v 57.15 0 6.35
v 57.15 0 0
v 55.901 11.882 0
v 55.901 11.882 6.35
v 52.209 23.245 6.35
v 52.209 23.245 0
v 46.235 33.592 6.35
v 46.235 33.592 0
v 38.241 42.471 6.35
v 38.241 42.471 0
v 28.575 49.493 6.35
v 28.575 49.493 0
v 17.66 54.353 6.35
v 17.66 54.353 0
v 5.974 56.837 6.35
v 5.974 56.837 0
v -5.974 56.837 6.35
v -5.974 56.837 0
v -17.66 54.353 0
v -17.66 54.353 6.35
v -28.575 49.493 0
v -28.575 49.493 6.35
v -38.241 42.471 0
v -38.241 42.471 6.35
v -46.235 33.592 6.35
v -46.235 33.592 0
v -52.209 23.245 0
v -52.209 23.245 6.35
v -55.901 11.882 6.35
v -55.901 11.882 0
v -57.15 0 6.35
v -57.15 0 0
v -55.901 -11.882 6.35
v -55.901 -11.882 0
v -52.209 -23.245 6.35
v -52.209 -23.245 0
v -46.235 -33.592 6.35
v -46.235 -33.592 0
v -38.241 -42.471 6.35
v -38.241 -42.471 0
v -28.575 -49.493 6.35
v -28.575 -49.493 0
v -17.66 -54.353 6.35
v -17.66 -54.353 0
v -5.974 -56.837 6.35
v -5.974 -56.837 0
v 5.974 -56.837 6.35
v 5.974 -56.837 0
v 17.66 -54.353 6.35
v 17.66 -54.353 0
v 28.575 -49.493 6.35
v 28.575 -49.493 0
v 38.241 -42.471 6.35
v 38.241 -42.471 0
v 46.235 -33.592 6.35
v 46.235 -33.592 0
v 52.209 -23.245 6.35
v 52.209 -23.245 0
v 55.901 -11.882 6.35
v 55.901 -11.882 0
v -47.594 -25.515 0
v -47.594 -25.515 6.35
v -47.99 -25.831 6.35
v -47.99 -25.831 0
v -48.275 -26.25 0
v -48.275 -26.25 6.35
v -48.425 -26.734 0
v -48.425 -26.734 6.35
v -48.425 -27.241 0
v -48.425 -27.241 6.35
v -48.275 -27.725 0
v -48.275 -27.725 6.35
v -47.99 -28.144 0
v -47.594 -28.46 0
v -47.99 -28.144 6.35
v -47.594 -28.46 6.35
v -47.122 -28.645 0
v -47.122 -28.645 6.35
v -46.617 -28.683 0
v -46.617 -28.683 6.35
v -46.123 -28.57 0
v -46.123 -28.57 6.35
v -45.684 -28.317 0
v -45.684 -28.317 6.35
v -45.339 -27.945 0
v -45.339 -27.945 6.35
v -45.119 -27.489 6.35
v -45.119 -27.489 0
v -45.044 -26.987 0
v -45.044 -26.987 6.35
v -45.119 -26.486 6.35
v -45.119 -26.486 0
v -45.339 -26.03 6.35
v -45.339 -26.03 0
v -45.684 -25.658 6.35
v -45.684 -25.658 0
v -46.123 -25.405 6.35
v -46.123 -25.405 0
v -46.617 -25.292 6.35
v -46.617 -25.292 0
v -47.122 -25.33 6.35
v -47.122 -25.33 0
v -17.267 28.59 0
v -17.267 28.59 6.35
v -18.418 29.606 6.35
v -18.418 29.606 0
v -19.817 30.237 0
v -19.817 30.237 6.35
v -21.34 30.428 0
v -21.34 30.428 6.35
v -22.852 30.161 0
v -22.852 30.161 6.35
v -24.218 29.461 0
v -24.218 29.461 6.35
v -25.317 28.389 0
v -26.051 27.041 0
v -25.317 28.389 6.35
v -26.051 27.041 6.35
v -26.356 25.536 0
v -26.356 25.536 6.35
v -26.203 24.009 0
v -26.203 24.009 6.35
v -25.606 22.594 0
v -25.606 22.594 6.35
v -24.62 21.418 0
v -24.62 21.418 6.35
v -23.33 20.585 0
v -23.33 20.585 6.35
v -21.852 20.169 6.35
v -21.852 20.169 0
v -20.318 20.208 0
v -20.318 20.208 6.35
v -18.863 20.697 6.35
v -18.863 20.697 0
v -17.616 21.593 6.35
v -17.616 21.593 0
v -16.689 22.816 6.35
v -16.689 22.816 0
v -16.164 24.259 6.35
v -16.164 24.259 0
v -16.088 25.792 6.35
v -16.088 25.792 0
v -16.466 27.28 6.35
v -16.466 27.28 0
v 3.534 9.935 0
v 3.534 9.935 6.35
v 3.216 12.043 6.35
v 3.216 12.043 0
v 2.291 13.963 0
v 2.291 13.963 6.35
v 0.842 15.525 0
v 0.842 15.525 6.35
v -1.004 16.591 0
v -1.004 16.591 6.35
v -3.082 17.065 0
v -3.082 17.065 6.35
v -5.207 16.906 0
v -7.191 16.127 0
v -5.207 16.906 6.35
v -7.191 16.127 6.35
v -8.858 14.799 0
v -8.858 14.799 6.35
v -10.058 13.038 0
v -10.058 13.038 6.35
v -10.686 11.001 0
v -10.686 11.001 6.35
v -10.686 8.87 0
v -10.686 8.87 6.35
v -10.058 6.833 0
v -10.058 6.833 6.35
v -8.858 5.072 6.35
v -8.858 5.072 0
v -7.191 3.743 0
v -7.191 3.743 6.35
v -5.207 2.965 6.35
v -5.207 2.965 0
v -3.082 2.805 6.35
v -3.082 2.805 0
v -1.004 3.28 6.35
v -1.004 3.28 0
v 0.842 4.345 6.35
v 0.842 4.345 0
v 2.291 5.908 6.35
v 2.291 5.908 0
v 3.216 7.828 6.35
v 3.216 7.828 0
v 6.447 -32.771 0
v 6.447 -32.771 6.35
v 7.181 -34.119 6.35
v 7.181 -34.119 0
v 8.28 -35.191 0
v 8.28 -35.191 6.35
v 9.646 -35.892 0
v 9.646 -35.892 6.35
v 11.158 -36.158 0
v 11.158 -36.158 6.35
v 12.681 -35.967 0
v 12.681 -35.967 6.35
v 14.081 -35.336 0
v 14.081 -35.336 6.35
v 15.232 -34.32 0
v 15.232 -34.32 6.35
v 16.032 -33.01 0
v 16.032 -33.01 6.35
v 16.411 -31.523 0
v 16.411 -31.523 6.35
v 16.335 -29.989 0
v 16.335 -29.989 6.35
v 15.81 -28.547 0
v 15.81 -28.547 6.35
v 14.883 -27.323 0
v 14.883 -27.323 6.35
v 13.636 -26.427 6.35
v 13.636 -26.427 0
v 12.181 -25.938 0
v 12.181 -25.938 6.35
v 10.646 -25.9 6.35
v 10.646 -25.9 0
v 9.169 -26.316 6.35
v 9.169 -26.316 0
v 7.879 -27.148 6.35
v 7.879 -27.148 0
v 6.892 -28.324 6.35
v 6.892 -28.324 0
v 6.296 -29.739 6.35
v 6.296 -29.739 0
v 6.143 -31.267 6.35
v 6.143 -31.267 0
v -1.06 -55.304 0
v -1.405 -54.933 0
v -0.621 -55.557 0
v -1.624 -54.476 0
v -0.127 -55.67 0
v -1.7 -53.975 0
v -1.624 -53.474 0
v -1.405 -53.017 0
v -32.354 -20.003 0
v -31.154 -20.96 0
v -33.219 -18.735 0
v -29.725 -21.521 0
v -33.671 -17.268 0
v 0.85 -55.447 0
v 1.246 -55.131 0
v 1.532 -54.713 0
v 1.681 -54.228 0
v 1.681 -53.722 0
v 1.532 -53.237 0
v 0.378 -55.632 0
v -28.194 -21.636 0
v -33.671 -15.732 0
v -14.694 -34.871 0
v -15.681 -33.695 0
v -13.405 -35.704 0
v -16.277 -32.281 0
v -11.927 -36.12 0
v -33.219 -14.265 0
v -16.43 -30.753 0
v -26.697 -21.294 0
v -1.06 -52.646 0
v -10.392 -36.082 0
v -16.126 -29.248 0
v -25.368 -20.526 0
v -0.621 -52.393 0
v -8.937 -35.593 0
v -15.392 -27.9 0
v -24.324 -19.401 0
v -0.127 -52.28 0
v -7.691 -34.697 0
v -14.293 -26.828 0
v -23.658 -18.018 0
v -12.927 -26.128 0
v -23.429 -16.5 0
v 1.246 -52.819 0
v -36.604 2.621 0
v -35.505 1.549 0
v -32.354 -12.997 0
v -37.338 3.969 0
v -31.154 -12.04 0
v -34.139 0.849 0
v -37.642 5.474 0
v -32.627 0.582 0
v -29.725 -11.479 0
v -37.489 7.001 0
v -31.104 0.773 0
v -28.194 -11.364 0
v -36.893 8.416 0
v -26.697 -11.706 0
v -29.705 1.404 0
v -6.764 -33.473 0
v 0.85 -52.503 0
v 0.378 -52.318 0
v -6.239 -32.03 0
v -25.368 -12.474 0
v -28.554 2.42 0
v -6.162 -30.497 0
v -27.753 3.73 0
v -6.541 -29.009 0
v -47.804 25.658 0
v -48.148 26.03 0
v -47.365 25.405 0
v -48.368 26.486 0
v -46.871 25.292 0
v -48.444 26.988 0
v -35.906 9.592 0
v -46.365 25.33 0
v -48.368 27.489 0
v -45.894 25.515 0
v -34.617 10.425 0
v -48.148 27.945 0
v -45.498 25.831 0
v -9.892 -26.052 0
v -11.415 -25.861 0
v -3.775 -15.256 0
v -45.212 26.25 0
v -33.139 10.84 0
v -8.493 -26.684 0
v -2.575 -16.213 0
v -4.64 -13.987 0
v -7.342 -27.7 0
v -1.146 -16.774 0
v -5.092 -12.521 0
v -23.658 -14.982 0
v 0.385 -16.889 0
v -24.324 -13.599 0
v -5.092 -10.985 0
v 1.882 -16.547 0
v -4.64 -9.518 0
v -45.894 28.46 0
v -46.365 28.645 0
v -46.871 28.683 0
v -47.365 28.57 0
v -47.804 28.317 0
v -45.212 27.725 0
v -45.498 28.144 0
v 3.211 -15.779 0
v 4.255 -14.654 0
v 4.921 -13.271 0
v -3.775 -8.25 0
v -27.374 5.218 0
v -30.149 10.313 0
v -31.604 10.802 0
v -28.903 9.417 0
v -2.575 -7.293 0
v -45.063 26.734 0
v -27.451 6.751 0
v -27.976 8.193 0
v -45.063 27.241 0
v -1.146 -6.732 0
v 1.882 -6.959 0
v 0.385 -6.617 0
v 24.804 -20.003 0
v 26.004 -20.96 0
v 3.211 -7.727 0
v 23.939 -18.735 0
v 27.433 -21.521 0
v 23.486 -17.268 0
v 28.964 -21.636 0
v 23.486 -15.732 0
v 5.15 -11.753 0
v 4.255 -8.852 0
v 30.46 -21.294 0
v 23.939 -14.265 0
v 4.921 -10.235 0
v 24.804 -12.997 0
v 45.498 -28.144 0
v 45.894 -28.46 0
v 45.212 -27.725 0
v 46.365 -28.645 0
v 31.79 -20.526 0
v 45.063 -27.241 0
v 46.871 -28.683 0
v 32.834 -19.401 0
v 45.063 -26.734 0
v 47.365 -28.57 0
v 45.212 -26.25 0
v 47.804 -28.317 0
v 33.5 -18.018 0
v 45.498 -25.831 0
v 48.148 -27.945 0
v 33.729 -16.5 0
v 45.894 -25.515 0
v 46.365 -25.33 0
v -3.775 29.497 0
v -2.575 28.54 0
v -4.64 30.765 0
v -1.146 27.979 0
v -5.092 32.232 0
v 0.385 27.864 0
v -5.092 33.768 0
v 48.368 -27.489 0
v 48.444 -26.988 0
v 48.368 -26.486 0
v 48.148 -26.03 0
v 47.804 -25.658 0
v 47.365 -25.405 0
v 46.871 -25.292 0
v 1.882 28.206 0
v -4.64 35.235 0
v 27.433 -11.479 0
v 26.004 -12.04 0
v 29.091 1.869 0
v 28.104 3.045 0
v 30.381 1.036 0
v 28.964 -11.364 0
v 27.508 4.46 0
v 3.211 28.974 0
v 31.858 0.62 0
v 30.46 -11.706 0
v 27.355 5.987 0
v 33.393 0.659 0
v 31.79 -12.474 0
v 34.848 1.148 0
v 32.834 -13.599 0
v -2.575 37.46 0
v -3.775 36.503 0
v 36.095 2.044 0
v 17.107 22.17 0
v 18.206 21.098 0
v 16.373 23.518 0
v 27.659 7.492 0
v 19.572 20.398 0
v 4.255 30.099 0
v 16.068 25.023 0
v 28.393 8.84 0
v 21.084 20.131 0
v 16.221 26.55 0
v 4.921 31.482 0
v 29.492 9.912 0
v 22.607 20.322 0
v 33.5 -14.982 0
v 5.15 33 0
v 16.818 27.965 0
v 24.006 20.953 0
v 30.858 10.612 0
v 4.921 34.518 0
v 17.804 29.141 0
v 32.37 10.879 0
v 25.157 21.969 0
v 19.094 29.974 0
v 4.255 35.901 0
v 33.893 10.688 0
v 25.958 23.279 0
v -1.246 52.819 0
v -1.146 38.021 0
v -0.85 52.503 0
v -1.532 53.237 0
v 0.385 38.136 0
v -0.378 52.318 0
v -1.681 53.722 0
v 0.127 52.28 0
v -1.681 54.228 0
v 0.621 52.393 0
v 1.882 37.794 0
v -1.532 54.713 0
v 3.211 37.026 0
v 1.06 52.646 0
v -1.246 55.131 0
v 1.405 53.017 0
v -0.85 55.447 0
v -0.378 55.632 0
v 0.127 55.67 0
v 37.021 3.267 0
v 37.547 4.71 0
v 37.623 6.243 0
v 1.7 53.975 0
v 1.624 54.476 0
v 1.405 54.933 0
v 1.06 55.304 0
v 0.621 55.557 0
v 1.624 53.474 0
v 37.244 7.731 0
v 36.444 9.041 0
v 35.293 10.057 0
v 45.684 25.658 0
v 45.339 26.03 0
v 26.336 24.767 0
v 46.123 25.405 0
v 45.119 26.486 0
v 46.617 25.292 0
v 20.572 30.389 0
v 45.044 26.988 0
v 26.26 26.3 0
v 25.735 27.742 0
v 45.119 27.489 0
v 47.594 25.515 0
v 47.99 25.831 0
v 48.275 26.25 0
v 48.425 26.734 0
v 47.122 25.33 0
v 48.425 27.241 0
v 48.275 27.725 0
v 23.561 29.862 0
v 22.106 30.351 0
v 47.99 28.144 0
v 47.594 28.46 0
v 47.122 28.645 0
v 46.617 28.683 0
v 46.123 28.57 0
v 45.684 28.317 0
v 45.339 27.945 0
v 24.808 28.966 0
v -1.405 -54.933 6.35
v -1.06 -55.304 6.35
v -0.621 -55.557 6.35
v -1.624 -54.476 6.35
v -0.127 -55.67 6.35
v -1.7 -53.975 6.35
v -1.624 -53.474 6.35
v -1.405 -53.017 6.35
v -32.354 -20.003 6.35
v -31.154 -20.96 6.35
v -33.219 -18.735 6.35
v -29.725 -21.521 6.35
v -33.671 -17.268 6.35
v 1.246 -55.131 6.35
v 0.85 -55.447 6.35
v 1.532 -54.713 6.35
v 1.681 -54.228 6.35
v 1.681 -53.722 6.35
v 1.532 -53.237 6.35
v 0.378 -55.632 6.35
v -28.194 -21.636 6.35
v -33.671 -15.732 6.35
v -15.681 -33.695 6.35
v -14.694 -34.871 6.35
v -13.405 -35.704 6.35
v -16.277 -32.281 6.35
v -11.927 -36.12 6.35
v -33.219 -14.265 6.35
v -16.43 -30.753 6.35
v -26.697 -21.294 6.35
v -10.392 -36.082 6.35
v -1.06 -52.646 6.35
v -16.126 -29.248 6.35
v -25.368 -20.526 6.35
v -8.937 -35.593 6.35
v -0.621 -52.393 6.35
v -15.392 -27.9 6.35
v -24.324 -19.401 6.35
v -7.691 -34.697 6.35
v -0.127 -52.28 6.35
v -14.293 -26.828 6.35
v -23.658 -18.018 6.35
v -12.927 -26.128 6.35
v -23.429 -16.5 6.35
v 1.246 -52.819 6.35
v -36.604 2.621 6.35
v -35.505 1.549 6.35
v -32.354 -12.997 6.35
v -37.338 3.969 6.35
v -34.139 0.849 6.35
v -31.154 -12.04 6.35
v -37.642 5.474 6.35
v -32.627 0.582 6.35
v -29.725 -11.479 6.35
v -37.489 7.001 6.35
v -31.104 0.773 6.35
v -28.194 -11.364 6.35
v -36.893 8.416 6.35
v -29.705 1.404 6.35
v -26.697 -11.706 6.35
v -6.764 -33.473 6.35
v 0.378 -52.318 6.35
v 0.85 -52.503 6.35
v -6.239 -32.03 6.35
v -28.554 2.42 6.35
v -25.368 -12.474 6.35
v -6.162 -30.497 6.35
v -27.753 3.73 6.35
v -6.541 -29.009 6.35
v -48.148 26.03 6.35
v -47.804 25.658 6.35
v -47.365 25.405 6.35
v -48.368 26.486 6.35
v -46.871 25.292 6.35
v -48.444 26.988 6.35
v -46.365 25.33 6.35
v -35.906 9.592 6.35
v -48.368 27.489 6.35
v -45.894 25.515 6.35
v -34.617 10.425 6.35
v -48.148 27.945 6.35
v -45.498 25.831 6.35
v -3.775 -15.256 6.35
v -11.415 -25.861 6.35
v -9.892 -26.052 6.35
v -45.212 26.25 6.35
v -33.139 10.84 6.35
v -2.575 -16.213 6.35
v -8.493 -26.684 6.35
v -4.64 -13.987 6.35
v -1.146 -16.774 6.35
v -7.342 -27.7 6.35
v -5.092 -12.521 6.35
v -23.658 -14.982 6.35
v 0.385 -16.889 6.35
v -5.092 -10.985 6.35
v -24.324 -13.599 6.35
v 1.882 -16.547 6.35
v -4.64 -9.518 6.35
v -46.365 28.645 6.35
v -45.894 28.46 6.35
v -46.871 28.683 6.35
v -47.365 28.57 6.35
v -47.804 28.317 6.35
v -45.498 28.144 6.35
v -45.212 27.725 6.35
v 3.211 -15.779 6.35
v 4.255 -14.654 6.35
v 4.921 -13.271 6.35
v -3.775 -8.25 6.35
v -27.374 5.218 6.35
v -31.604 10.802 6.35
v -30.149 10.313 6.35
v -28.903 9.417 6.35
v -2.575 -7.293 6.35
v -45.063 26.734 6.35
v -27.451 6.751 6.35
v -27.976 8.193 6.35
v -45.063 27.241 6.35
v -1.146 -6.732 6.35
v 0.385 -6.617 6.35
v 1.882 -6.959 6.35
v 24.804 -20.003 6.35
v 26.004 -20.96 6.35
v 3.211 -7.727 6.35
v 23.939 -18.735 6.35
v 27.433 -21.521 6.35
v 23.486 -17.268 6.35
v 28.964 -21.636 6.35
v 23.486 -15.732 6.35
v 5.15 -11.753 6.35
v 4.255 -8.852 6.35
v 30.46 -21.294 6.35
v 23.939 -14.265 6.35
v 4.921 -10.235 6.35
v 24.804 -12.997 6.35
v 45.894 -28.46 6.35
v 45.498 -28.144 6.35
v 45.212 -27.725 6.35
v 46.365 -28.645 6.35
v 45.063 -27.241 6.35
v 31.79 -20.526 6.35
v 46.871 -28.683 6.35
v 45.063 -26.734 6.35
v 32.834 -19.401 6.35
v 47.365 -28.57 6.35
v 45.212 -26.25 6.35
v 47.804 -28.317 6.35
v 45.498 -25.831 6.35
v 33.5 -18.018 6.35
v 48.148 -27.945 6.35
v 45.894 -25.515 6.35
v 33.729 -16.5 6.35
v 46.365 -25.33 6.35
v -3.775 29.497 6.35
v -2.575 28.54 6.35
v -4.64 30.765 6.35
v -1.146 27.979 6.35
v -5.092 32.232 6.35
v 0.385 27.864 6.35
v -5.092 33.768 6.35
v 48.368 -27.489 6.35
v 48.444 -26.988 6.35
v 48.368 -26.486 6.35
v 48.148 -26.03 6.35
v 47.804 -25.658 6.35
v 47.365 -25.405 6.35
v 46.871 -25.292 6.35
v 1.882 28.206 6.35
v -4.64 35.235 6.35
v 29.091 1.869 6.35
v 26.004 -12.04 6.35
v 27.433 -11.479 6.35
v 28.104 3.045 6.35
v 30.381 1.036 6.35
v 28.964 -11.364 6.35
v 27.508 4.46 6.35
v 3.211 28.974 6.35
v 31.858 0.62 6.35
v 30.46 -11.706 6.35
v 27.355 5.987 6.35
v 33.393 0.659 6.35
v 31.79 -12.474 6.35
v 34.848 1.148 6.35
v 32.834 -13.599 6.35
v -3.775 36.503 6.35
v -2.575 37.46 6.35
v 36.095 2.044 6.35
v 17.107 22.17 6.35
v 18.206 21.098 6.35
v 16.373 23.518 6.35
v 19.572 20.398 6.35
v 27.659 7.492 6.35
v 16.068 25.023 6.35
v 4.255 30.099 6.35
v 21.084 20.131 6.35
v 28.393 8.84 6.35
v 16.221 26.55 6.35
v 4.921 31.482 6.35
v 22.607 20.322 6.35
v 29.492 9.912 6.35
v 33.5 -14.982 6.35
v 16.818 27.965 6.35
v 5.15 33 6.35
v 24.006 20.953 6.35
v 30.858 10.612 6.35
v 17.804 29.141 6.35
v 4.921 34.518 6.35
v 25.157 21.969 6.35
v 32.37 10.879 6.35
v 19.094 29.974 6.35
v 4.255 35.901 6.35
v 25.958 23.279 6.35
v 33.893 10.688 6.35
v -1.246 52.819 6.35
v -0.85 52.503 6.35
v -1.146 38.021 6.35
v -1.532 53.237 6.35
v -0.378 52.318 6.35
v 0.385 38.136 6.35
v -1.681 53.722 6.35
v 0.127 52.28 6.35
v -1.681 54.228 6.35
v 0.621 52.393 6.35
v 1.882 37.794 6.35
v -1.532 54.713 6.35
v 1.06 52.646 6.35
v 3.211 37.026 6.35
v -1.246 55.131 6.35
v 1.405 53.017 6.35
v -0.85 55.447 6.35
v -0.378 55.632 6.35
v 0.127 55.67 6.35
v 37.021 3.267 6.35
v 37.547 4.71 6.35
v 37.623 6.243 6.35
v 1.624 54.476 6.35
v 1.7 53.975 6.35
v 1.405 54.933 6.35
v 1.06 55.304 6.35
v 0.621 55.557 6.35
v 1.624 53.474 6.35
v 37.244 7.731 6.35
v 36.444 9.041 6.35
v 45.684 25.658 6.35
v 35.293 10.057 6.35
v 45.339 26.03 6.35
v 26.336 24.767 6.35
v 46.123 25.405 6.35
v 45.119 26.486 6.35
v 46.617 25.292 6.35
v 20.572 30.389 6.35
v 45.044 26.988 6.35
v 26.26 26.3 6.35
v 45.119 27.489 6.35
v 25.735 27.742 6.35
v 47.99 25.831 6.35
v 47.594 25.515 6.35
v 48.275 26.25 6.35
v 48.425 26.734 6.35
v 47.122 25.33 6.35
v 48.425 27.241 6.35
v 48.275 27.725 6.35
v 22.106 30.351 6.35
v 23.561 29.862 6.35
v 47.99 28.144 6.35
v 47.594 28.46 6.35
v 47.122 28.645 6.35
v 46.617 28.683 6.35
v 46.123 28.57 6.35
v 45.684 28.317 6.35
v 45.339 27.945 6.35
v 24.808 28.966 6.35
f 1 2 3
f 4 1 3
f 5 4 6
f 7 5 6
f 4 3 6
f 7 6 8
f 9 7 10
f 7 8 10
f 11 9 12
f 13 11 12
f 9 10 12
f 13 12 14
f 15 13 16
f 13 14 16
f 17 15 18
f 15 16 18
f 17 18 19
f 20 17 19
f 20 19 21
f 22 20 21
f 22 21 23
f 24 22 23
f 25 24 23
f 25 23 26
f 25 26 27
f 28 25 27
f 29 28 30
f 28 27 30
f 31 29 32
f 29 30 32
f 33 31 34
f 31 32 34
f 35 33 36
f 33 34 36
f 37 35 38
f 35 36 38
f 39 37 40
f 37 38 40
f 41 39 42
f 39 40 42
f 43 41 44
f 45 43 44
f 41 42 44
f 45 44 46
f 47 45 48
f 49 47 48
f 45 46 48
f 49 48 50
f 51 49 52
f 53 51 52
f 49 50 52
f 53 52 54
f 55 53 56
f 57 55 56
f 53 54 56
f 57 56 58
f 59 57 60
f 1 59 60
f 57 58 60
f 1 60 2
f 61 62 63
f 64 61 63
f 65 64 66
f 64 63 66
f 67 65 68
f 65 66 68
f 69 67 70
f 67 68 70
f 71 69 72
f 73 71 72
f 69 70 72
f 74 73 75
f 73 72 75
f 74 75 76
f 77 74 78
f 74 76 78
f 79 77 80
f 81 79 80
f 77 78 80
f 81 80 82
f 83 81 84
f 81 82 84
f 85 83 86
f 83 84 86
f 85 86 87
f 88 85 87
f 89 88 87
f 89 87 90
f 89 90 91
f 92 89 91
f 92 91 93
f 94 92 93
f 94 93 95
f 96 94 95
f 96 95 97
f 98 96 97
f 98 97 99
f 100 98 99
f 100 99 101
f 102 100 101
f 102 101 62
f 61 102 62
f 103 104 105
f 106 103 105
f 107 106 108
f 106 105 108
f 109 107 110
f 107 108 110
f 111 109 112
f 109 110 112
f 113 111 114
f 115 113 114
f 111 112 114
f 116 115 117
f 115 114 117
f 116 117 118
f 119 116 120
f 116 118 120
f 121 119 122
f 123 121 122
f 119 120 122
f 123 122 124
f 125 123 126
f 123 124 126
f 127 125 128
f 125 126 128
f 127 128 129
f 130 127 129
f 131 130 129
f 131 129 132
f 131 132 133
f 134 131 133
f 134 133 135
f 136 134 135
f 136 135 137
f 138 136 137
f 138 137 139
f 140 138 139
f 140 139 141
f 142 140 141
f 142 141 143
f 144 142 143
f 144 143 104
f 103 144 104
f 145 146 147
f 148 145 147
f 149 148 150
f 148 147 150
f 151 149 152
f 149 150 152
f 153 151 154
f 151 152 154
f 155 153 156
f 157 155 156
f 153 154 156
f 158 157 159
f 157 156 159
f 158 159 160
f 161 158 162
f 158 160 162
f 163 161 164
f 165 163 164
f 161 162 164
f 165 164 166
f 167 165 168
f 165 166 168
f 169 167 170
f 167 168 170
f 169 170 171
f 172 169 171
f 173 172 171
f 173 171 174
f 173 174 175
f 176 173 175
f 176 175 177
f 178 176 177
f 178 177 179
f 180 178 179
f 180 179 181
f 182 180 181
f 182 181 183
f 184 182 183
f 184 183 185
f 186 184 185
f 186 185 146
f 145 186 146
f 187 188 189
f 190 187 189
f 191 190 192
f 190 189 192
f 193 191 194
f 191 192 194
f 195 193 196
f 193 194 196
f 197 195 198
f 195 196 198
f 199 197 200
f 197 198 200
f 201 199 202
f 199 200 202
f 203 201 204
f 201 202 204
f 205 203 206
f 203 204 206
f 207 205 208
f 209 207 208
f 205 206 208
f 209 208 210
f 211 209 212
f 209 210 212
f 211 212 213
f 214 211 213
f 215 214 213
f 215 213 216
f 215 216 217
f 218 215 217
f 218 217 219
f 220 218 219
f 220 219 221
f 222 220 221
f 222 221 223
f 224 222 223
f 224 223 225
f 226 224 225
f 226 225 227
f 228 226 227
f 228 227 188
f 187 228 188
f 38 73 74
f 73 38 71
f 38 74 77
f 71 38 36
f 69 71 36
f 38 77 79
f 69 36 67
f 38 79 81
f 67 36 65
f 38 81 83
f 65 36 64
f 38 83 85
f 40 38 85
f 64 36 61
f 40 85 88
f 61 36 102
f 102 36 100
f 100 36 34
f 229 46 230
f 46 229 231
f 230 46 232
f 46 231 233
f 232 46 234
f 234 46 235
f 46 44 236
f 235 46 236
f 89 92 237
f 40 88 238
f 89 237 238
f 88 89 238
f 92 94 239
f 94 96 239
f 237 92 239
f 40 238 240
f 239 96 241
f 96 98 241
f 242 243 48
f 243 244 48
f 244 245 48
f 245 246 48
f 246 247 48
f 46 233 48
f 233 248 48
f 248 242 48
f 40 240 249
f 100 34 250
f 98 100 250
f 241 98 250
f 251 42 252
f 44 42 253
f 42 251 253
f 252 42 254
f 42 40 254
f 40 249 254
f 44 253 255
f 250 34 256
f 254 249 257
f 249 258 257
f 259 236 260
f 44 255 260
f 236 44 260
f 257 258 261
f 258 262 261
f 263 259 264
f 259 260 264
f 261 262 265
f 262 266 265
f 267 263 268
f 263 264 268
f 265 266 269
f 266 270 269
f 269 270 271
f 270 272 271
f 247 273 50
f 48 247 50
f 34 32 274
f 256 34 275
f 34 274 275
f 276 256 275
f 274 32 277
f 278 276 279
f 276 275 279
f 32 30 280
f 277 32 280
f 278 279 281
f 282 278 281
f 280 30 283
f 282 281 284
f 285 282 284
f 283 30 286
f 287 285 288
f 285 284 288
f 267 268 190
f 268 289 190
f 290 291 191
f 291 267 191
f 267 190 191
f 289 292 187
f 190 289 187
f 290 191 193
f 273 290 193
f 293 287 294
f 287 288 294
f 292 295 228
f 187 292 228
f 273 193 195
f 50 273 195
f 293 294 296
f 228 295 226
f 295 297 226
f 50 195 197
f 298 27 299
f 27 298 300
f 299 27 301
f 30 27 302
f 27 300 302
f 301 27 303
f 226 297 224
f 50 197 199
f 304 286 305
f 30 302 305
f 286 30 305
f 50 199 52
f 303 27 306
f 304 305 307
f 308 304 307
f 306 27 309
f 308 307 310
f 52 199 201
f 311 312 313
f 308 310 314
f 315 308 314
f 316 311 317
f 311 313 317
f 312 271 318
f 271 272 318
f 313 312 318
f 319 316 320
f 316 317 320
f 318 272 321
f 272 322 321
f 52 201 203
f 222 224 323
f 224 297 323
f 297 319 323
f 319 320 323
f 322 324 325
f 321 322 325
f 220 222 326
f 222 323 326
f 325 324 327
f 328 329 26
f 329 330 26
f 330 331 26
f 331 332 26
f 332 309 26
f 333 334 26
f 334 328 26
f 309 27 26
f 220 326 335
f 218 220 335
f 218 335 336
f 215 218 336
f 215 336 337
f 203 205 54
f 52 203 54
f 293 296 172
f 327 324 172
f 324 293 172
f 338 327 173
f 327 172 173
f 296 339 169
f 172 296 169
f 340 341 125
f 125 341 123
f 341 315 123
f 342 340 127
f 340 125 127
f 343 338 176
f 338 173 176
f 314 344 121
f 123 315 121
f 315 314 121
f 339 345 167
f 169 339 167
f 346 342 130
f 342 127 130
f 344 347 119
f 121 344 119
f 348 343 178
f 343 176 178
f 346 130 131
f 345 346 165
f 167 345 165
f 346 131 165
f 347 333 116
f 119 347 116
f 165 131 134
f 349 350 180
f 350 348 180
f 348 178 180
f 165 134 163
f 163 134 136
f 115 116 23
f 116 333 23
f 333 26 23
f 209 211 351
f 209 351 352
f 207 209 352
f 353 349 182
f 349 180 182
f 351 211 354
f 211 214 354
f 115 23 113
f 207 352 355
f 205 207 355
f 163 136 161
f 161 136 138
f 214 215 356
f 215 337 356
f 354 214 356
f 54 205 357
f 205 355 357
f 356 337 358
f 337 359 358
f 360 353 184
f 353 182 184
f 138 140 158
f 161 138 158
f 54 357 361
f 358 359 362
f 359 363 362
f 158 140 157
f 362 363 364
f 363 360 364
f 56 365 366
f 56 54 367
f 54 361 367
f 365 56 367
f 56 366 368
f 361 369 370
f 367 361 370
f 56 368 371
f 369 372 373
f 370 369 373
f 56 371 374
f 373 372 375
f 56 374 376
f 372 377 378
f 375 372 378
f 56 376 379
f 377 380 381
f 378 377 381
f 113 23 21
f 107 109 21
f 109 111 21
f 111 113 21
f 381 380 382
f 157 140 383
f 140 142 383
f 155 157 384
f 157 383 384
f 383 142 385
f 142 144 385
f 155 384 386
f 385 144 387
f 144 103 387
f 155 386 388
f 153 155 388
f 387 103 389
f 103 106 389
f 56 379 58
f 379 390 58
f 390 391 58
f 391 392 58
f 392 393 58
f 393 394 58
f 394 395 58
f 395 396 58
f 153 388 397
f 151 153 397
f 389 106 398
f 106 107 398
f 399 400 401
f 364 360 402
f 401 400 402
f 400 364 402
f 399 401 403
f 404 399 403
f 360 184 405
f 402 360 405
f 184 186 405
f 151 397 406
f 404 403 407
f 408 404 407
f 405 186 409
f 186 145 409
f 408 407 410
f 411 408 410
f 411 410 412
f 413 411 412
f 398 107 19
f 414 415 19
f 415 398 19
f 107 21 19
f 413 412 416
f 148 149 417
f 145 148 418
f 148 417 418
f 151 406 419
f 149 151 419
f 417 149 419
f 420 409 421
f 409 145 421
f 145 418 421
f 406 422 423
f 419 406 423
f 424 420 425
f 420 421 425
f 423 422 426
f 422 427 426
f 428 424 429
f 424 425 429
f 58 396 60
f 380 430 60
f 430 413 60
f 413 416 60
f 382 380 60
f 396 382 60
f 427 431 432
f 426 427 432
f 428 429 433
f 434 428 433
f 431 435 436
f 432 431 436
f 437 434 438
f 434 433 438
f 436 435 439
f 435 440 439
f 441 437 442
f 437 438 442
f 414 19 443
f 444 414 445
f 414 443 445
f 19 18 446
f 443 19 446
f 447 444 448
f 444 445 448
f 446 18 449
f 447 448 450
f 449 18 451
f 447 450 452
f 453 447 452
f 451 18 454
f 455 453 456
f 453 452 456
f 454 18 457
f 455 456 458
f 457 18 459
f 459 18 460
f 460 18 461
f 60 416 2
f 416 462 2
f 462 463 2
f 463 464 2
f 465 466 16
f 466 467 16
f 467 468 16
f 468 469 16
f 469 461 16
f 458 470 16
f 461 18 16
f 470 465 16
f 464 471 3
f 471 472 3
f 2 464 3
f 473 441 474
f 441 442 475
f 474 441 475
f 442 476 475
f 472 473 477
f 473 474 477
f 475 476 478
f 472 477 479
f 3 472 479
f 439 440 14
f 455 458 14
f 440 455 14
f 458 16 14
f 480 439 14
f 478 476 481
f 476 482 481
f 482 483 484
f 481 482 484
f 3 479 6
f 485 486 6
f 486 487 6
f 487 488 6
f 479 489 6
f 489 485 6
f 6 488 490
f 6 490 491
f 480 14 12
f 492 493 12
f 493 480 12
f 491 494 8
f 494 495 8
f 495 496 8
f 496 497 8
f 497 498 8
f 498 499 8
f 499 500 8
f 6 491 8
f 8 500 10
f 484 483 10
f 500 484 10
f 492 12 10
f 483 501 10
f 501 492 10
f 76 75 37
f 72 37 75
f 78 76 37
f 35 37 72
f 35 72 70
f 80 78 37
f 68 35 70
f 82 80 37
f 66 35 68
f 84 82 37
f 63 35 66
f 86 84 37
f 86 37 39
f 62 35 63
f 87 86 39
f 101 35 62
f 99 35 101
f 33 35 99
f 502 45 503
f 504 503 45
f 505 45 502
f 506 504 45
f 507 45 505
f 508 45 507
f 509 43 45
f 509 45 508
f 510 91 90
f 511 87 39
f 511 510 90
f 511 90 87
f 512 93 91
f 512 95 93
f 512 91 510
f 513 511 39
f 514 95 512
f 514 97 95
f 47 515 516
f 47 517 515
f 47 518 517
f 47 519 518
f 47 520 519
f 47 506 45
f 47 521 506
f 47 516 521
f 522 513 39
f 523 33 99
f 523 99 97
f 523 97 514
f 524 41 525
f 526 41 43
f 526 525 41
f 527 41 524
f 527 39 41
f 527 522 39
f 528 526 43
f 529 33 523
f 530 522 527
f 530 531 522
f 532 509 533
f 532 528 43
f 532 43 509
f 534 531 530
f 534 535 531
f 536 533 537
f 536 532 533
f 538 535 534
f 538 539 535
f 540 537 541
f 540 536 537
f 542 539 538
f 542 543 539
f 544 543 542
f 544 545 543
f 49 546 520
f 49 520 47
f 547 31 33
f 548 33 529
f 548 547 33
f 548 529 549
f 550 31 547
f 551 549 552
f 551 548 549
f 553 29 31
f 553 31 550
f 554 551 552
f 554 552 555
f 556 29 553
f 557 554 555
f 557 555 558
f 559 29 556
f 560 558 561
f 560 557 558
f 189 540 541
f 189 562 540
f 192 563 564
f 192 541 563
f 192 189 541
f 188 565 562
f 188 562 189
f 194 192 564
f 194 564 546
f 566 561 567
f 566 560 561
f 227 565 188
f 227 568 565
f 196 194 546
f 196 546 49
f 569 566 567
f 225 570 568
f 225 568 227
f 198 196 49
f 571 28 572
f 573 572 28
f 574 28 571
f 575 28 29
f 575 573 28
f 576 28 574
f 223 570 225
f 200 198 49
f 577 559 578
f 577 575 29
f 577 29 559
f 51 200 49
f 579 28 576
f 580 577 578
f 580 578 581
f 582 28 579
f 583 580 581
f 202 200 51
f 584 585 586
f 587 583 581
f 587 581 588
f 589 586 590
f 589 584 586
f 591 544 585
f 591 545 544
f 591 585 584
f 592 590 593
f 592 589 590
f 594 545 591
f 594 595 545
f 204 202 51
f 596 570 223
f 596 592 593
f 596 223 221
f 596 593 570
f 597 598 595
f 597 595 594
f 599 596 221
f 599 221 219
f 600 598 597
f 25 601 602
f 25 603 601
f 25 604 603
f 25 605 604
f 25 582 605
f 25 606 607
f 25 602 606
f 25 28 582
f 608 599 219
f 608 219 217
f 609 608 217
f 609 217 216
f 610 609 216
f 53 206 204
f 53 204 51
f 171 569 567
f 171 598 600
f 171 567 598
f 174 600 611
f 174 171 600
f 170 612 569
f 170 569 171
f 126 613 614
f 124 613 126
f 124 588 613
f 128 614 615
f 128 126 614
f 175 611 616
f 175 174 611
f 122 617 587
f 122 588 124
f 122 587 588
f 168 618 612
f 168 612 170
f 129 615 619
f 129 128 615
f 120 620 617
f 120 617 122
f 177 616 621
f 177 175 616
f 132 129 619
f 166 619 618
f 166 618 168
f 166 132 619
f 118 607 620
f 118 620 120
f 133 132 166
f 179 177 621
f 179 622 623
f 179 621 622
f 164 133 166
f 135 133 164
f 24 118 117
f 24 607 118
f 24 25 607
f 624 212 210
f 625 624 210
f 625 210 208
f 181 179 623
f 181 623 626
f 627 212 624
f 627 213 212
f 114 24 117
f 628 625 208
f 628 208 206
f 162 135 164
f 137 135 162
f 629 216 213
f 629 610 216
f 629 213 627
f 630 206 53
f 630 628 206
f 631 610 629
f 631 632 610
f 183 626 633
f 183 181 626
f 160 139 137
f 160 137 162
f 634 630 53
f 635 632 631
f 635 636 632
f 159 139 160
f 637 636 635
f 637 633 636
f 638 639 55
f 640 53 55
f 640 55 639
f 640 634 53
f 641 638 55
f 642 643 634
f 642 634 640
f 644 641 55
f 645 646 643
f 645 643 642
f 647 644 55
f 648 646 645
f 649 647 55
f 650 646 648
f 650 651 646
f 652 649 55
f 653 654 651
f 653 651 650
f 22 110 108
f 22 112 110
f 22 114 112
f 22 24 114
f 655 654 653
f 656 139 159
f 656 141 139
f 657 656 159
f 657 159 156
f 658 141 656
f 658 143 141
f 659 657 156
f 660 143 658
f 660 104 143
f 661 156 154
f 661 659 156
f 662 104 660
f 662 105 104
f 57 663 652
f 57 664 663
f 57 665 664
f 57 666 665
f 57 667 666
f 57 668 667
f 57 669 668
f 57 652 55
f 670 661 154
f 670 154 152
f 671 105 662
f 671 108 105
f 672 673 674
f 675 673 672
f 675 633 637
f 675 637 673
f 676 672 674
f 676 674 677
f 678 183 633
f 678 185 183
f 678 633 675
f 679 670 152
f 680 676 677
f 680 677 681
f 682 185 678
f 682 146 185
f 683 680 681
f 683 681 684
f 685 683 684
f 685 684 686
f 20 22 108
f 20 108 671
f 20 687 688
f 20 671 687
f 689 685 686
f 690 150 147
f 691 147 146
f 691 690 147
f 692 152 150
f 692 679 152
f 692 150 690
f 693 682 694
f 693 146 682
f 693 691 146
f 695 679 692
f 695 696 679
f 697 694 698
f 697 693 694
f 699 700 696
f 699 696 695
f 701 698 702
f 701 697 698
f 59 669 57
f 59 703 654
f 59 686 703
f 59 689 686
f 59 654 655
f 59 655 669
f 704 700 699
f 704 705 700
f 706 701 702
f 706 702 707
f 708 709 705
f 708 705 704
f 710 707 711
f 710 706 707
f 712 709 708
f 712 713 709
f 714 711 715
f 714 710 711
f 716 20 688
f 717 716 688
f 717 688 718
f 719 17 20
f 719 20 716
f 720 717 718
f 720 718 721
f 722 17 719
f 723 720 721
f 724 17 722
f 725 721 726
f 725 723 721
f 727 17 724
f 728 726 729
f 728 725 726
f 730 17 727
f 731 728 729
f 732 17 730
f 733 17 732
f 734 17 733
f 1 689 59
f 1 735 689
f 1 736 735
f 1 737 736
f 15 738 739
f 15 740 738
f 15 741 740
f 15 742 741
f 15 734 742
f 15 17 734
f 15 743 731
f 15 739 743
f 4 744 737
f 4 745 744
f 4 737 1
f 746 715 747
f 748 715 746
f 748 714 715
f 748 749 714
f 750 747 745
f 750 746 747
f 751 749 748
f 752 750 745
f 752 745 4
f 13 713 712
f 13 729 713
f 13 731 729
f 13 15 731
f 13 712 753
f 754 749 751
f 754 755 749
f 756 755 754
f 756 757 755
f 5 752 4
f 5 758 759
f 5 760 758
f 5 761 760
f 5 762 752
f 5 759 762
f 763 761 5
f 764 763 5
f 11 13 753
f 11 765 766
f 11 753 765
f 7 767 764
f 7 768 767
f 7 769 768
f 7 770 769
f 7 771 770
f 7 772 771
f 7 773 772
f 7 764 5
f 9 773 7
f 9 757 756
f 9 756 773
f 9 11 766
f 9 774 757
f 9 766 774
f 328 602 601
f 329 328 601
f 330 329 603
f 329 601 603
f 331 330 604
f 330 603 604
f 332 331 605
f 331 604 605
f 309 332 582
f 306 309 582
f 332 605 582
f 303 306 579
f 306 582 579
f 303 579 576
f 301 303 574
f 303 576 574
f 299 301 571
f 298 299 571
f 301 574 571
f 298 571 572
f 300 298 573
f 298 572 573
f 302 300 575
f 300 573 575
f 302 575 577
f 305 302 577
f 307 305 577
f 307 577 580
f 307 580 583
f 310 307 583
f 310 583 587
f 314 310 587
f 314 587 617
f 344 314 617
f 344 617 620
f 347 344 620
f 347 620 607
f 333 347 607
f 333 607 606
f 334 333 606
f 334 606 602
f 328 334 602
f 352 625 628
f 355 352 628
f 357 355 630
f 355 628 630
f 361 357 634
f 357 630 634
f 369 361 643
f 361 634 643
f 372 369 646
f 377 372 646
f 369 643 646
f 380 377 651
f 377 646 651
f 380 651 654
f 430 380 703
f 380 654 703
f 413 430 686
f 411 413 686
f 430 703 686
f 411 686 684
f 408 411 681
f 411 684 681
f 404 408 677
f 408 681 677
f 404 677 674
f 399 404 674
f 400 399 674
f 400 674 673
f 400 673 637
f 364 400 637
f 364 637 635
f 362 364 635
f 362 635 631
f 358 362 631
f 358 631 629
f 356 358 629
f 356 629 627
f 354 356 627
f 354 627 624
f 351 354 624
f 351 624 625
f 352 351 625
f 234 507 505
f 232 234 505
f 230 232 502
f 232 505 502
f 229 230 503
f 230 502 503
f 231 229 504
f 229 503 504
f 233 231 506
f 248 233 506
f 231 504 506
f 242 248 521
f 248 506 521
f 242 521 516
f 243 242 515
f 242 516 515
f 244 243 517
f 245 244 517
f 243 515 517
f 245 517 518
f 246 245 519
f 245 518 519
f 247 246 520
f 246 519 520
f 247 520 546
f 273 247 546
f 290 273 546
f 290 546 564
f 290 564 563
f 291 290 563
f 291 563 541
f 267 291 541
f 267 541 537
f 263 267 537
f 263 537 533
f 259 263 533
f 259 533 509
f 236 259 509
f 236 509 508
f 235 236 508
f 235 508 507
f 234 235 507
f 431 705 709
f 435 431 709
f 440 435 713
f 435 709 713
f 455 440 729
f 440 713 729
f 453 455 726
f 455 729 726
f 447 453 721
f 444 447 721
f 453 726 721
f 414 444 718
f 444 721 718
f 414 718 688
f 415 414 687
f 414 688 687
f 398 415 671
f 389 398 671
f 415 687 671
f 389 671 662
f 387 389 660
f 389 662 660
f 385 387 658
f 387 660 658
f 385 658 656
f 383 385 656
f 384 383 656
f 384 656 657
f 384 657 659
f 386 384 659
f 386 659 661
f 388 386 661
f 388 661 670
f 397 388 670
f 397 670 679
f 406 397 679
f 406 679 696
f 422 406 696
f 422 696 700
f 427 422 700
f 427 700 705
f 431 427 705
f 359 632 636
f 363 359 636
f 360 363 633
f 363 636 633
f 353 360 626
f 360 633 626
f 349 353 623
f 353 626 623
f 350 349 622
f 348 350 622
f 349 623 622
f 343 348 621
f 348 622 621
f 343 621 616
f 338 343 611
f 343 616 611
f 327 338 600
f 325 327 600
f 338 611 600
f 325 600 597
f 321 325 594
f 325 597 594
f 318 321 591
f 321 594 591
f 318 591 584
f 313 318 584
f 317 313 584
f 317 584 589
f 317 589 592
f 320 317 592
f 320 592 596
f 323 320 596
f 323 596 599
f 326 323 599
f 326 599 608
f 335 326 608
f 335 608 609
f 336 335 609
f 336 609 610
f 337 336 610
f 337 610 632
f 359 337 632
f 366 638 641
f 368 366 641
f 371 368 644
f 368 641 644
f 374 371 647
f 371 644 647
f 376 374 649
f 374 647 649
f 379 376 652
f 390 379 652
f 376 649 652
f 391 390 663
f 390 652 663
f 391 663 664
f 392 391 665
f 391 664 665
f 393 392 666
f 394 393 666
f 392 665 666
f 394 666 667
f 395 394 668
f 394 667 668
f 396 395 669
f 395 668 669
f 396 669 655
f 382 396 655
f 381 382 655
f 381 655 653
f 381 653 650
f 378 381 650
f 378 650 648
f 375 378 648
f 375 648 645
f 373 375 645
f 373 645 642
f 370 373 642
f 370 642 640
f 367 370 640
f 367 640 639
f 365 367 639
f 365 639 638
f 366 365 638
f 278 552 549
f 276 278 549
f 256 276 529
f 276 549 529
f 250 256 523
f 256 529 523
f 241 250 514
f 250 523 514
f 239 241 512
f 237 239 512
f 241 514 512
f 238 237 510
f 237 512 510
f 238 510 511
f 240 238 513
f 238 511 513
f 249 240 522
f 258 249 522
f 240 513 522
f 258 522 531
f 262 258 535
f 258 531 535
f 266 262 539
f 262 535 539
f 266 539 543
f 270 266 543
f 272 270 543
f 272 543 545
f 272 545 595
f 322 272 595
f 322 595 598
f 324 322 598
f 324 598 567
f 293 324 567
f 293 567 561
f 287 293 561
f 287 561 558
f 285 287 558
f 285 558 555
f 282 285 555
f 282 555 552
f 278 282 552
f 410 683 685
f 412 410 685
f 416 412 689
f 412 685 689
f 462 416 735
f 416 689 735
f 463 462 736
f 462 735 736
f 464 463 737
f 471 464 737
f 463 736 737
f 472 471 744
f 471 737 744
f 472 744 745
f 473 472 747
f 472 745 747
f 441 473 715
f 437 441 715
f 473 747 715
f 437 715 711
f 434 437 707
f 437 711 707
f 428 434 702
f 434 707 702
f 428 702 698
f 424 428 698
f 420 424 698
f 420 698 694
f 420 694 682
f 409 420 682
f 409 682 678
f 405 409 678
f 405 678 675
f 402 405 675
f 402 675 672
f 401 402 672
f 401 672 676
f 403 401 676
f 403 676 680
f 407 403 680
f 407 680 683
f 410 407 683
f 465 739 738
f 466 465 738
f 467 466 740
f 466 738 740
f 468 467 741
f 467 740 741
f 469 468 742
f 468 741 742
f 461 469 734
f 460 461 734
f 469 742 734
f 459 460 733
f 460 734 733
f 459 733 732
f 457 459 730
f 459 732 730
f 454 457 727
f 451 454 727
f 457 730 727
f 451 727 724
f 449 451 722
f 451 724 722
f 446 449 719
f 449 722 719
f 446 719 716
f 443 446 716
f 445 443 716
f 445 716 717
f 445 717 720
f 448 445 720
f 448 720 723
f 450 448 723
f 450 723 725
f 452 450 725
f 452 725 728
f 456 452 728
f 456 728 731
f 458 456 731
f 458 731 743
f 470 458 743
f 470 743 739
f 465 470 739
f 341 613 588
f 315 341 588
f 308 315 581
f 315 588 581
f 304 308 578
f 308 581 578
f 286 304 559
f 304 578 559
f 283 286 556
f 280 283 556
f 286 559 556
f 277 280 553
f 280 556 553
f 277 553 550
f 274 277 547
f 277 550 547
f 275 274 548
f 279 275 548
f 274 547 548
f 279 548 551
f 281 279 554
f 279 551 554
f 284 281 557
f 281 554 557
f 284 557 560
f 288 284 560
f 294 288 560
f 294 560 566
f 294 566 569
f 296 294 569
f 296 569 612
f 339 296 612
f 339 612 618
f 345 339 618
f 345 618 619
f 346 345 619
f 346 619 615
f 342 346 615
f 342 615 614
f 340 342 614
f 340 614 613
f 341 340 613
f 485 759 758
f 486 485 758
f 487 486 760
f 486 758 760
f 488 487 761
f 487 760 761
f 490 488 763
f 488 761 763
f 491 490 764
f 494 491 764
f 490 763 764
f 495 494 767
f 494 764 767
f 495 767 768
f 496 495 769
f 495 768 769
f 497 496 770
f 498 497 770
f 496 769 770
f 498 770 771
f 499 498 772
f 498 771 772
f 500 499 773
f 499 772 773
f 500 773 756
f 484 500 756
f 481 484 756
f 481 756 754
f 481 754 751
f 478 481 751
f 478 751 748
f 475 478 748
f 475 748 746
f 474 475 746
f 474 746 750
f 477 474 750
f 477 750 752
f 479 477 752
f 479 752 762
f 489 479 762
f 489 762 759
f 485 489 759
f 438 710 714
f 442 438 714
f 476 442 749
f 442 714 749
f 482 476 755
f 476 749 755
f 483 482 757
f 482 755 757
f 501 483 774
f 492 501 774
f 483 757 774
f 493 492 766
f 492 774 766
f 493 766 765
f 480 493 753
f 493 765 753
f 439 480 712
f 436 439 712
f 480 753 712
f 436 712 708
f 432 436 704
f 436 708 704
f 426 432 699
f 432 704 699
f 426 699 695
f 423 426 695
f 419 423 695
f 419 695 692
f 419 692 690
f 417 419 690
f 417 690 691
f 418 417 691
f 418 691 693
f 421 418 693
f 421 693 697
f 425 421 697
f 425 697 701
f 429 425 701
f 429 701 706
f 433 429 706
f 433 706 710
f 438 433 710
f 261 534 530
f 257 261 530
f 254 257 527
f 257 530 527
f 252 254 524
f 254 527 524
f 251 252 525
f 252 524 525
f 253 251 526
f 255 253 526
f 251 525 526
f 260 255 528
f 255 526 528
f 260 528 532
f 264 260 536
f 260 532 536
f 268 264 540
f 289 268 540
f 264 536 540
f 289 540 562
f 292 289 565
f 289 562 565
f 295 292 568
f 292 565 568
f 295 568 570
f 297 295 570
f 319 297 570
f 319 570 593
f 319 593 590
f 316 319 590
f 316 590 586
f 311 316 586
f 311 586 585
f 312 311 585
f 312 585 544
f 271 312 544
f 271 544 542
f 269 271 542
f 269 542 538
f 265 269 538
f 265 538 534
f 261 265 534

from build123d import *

# Parameters (mm, degrees)
SKETCH2_R           = 57.15
BOSS_EXTRUDE1_DEPTH = 6.35
SKETCH3_R           = 5.15
CUT_EXTRUDE1_DEPTH  = 7.35
CIRPATTERN1_COUNT   = 9
SKETCH6_R           = 1.7
CUT_EXTRUDE4_DEPTH  = 7.35
CIRPATTERN3_COUNT   = 6
SKETCH7_R           = 7.15
SKETCH7_R_2         = 5.15
CUT_EXTRUDE5_DEPTH  = 7.35


with BuildPart() as part:
    # Sketch2 → Boss-Extrude1 (new body)
    with BuildSketch(Plane.XY):
        Circle(SKETCH2_R)
    extrude(amount=BOSS_EXTRUDE1_DEPTH)

    # Sketch3 → Cut-Extrude1 (cut, through all)
    with BuildSketch(Plane.XY.offset(6.35)):
        with Locations((0, 33)):
            Circle(SKETCH3_R)
    cut_extrude1 = extrude(amount=-CUT_EXTRUDE1_DEPTH, mode=Mode.SUBTRACT)

    # CirPattern1: Cut-Extrude1 ×9 about axis
    cirpattern1_axis = Axis((0, 0, 0), (0, 0, 1))
    for i in range(1, CIRPATTERN1_COUNT):
        add(cut_extrude1.rotate(cirpattern1_axis, i * 360 / CIRPATTERN1_COUNT), mode=Mode.SUBTRACT)

    # Sketch6 → Cut-Extrude4 (cut, through all)
    with BuildSketch(Plane.XY.offset(6.35)):
        with Locations((0, 53.975)):
            Circle(SKETCH6_R)
    cut_extrude4 = extrude(amount=-CUT_EXTRUDE4_DEPTH, mode=Mode.SUBTRACT)

    # CirPattern3: Cut-Extrude4 ×6 about axis
    cirpattern3_axis = Axis((0, 0, 0), (0, 0, 1))
    for i in range(1, CIRPATTERN3_COUNT):
        add(cut_extrude4.rotate(cirpattern3_axis, i * 360 / CIRPATTERN3_COUNT), mode=Mode.SUBTRACT)

    # Sketch7 → Cut-Extrude5 (cut, through all)
    with BuildSketch(Plane.XY.offset(6.35)):
        with Locations((-3.616187958, 9.935394759)):
            Circle(SKETCH7_R)
        with Locations((0, -11.752952649)):
            Circle(SKETCH7_R_2)
    extrude(amount=-CUT_EXTRUDE5_DEPTH, mode=Mode.SUBTRACT)


solid = part.part
